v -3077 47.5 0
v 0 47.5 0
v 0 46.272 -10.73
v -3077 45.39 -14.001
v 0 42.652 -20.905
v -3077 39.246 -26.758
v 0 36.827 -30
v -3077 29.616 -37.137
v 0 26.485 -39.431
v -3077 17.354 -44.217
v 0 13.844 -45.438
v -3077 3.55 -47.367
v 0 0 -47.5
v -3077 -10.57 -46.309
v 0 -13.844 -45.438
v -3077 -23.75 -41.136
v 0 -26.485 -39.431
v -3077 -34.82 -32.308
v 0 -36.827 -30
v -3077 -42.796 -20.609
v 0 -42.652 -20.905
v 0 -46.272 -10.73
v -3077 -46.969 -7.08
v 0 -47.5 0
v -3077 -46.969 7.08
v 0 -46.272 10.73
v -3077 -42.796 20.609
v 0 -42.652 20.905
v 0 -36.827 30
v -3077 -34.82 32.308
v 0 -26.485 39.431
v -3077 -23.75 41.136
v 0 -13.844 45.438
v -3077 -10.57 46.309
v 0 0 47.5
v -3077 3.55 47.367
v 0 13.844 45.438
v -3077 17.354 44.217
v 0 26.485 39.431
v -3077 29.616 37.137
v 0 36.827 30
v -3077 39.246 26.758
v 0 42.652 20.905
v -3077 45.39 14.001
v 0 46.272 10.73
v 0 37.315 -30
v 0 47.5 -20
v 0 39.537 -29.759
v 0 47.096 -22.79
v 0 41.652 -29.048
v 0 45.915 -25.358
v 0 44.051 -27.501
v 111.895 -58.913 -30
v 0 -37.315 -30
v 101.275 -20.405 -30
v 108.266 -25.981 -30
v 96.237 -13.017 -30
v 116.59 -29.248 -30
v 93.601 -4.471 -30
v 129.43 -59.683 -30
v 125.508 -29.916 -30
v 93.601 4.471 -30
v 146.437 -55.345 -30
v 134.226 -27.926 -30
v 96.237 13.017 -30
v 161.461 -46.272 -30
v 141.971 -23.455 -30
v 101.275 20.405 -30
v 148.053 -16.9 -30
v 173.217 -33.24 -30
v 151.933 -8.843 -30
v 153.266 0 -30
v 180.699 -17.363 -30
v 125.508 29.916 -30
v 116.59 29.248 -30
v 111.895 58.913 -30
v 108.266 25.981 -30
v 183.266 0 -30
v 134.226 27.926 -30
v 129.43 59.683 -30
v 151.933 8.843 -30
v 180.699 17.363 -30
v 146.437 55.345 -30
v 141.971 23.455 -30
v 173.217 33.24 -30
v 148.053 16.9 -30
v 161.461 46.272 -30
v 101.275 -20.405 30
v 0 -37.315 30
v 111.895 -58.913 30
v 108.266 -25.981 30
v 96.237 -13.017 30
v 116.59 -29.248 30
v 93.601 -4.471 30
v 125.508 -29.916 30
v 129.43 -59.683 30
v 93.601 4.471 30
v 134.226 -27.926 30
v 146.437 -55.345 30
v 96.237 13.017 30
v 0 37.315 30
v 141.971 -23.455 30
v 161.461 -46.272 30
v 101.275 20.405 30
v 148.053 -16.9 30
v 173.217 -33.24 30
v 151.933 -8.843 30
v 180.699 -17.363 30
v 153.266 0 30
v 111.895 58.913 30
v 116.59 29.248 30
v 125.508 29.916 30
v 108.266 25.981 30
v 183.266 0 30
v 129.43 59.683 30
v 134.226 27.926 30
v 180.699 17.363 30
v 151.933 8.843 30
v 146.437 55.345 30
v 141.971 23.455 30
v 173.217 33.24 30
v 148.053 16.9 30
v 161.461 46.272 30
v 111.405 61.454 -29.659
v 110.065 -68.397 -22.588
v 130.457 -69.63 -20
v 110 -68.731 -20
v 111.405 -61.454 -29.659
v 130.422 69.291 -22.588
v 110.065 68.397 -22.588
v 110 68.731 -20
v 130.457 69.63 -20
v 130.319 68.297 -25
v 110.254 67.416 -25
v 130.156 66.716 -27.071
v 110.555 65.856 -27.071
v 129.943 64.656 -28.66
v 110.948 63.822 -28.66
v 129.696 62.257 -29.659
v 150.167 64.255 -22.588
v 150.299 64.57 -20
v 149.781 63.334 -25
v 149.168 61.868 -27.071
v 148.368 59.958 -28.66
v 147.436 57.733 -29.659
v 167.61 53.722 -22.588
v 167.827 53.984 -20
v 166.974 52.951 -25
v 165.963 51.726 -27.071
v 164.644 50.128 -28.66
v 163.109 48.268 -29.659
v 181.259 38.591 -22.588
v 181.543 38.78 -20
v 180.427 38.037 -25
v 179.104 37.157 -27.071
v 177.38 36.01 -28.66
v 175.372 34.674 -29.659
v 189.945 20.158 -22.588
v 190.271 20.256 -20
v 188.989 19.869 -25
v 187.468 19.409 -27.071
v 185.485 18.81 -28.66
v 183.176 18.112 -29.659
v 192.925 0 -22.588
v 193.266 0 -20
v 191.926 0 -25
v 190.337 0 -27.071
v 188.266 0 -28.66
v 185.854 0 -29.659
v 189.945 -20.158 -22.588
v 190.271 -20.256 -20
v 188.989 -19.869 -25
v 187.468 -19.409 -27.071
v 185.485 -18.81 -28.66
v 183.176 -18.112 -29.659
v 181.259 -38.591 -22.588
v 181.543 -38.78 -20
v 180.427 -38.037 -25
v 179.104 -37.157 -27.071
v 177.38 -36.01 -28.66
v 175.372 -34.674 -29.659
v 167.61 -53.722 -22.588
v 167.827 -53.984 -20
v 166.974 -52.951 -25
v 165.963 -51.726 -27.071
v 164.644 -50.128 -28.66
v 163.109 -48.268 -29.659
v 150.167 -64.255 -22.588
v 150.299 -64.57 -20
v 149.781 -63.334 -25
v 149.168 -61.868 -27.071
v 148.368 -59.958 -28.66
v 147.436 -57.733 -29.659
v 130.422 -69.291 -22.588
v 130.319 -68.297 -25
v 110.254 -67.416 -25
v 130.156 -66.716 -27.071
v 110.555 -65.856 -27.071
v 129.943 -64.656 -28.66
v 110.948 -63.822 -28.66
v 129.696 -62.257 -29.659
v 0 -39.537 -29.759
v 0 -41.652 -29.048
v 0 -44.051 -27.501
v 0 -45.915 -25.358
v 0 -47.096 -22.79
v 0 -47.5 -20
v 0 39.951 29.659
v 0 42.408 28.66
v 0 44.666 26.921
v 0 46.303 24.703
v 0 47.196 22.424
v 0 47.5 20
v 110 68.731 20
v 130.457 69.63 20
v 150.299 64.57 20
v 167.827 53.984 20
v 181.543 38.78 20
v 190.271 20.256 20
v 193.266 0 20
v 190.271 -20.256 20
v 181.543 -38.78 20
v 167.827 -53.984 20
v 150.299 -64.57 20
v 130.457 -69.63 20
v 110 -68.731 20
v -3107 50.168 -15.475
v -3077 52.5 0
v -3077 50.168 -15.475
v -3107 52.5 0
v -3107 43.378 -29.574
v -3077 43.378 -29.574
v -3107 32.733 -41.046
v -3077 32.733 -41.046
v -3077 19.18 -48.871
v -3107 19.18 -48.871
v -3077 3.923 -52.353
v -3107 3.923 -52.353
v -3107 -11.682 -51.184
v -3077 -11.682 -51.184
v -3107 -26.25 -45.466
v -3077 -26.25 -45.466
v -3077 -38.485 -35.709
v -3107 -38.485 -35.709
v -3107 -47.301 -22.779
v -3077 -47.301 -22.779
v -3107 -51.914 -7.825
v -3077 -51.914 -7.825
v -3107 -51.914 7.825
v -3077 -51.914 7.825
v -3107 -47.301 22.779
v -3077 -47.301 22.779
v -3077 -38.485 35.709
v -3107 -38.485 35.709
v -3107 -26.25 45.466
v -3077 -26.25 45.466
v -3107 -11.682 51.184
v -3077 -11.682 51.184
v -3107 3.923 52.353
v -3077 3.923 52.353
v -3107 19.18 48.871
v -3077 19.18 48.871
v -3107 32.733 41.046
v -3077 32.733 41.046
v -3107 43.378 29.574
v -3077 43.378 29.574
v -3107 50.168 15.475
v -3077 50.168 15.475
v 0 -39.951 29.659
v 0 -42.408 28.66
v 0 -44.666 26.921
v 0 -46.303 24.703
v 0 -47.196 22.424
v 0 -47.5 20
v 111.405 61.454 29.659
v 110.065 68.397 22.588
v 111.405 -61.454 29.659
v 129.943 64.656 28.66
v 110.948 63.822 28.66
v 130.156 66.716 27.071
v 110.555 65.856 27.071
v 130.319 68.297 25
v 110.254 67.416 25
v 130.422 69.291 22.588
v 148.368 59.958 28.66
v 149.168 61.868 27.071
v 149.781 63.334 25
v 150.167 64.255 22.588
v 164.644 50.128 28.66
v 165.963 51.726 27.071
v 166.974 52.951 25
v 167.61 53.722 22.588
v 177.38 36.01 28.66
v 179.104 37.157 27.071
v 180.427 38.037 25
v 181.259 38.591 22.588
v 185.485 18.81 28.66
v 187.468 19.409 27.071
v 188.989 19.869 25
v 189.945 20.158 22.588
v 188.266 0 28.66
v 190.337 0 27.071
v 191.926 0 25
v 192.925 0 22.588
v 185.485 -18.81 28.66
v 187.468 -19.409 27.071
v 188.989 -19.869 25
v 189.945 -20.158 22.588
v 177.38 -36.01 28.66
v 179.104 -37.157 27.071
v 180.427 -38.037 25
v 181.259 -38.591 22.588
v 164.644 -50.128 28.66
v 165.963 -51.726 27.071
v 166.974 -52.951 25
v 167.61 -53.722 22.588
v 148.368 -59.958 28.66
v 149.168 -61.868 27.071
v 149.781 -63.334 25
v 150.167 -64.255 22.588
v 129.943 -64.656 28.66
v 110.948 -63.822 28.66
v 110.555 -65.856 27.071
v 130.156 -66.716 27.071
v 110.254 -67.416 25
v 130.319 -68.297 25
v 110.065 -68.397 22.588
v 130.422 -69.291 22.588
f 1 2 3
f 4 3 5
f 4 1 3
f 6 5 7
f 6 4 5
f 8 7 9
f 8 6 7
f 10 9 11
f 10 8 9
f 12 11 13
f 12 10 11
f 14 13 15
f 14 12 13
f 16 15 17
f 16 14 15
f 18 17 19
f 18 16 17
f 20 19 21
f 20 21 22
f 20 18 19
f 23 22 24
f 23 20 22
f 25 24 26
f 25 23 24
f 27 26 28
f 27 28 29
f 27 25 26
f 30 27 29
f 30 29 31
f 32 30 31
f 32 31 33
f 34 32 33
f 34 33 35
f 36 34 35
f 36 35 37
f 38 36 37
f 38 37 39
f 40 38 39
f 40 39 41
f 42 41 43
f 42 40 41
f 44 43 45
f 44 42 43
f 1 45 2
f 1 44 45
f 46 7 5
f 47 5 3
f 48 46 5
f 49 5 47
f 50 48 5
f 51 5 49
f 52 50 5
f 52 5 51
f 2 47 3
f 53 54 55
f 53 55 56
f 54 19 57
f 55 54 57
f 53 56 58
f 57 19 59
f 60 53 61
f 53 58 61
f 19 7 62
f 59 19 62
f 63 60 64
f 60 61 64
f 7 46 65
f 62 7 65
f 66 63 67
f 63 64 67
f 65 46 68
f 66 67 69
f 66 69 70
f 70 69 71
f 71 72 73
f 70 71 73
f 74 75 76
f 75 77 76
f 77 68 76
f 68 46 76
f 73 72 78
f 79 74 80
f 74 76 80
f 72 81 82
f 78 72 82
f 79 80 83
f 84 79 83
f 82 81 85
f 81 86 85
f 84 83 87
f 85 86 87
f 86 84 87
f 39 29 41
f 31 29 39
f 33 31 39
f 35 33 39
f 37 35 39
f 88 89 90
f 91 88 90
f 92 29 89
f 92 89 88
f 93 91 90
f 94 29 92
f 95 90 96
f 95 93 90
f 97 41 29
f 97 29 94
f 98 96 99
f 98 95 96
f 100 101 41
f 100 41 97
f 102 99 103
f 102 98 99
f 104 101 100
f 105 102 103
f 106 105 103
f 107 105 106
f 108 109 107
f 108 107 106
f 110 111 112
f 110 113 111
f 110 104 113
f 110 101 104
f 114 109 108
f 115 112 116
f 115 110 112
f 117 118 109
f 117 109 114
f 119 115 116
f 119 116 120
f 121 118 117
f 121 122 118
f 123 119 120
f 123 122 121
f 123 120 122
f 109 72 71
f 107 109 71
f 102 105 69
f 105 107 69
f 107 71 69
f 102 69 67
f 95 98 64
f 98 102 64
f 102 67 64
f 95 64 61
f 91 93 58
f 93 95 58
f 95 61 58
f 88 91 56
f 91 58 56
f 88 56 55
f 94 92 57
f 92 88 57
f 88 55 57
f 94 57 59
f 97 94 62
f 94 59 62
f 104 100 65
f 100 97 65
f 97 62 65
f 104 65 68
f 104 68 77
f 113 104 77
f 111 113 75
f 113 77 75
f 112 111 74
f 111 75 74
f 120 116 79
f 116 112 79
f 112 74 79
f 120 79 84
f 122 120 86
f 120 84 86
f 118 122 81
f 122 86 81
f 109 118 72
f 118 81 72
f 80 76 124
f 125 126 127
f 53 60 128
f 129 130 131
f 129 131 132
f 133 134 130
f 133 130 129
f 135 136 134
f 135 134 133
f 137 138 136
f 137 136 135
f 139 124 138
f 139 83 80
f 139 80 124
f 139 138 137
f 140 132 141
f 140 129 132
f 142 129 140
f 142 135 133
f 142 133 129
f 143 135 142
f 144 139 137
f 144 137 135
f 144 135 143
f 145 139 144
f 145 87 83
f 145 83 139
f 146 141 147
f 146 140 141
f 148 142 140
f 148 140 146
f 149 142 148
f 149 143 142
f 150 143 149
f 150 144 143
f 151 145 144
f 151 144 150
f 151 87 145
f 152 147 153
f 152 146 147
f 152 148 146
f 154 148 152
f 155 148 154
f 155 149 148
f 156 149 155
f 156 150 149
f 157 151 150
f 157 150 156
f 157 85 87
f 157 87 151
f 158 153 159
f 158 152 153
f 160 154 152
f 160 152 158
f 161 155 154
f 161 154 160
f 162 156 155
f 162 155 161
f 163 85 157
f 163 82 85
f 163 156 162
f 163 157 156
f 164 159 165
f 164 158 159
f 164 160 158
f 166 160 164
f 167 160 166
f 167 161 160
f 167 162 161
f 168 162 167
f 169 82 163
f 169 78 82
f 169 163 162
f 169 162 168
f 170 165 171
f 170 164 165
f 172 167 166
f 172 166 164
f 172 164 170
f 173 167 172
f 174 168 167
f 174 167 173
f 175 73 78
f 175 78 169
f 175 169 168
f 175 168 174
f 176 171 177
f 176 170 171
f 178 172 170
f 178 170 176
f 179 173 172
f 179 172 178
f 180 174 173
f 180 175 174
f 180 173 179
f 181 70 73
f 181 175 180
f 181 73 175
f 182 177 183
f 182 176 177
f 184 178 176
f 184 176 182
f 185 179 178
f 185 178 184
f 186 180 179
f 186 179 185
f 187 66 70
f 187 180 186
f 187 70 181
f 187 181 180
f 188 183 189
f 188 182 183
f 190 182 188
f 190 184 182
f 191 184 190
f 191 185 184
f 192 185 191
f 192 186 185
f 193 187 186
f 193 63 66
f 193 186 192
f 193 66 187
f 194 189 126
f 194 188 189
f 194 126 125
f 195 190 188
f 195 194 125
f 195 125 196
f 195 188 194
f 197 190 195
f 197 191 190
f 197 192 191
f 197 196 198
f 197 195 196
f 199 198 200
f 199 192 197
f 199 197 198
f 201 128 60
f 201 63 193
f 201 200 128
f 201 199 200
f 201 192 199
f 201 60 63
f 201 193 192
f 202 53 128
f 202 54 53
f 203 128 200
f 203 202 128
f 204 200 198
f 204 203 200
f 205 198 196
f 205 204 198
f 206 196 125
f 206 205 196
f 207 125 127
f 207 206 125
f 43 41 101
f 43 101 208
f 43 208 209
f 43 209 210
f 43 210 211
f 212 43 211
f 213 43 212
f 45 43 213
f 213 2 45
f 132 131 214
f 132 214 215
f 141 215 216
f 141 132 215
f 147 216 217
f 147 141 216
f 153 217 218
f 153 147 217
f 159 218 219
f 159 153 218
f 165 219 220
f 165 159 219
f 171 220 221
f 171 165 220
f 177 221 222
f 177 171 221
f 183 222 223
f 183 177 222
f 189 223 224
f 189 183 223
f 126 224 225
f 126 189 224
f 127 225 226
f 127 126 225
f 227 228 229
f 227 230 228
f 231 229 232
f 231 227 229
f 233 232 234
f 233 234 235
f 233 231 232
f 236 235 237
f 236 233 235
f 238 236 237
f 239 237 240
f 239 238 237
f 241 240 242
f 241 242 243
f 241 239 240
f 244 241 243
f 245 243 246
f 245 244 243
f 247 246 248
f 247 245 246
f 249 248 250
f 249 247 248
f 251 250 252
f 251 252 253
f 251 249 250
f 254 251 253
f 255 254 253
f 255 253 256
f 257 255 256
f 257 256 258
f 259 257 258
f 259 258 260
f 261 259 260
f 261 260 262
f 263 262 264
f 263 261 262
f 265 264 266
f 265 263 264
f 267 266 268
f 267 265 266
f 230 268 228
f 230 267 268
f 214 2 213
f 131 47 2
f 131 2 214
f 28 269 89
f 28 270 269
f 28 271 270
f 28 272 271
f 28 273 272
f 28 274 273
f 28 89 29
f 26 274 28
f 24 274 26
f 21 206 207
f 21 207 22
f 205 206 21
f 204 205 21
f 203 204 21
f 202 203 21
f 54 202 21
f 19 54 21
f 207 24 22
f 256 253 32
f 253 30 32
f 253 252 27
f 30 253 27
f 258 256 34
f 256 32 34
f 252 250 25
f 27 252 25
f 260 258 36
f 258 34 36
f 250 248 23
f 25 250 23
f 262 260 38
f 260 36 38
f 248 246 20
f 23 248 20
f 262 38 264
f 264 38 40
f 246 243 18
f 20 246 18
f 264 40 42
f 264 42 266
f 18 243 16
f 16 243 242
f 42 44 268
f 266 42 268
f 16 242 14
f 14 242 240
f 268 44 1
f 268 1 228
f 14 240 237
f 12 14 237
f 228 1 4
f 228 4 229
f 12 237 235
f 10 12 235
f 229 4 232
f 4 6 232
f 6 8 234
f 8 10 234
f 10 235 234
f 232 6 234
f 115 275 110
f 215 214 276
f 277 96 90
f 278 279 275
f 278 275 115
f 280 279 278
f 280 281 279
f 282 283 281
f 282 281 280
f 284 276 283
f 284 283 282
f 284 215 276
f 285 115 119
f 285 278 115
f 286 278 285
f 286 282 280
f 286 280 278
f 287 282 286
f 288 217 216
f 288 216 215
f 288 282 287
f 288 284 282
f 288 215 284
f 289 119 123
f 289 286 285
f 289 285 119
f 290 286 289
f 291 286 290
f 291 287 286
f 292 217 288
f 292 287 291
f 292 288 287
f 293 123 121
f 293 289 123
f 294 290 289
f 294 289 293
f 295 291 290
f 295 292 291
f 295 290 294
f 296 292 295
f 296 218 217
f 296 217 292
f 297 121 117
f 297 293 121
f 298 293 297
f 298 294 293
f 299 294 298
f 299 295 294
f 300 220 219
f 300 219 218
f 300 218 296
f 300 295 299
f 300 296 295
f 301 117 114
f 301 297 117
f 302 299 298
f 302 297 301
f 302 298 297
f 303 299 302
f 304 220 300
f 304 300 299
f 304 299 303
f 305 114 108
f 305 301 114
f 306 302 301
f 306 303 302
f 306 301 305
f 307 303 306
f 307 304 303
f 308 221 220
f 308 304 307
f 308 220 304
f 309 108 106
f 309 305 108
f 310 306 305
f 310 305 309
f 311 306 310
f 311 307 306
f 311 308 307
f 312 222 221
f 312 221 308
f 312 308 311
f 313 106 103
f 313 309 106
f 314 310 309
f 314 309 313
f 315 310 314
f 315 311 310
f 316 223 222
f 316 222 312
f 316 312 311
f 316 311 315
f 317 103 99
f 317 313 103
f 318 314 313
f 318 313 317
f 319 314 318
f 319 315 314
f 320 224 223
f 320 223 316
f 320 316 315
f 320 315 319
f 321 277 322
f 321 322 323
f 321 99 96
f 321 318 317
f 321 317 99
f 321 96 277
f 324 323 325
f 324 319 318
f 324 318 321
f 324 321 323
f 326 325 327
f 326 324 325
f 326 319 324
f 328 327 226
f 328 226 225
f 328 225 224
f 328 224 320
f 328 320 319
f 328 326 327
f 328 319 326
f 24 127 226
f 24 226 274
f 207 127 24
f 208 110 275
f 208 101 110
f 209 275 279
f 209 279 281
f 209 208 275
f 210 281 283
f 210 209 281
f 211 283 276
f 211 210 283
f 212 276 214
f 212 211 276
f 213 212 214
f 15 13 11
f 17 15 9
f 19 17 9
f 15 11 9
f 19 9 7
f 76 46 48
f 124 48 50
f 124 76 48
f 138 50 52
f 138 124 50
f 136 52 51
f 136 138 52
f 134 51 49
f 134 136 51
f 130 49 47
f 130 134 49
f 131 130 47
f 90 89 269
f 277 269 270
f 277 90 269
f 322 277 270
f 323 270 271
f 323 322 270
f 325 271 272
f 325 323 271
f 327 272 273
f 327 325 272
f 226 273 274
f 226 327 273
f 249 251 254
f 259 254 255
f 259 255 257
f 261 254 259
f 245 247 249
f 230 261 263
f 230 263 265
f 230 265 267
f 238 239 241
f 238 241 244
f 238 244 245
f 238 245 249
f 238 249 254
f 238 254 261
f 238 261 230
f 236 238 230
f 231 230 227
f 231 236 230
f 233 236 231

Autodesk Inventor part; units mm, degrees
ref_plane "YZ Plane" through (0, 0, 0) normal (1, 0, 0) x (0, 1, 0)
ref_plane "XZ Plane" through (0, 0, 0) normal (0, 1, 0) x (-1, 0, 0)
ref_plane "XY Plane" through (0, 0, 0) normal (0, 0, 1) x (1, 0, 0)
sketch "Эскиз1" plane through (0, 0, 0) normal (0, 0, 1) x (1, 0, 0)
  line L0 (0, 0) -> (-3498.9825, 0)
  line L1 (0, 0) -> (0, 72.2666) construction
  line L2 (0, 47.5) -> (-3077, 47.5)
  line L3 (-3077, 47.5) -> (-3077, 52.5)
  line L4 (-3077, 52.5) -> (-3107, 52.5)
  line L5 (-3107, 52.5) -> (-3107, 0)
  line L6 (0, 0) -> (0, 47.5)
  point P0 (-3107, 0)
  dimension "d1" = 105
  dimension "d2" = 95
  dimension "d3" = 30
  dimension "d4" = 3107
revolve "Вращение1" add sketch "Эскиз1" angle 360 about axis through (0, 0, 0) along (-1, 0, 0)
sketch "Эскиз2" plane through (0, 0, 0) normal (0, 0, 1) x (1, 0, 0)
  line L0 (-3077, -47.5) -> (-3077, 47.5) projected
  line L1 (0, -47.5) -> (0, 47.5) projected
  circle A0 centre (123.2661, 0) radius 30
  circle A1 centre (123.2661, 0) radius 70
  line L2 (110, -68.7314) -> (0, -47.5)
  line L3 (0, -47.5) -> (0, 47.5) projected
  line L4 (0, 47.5) -> (110, 68.7314)
  point P0 (0, 0)
  point P1 (0, 0)
  dimension "d6" = 60
  dimension "d7" = 140
  dimension "d8" = 110
extrude "Выдавливание1" add sketch "Эскиз2" along normal mid plane 60
fillet "Сопряжение1" radius 10 6 edges at (193.2661, 0, 30) (55, -58.1157, 30) (55, 58.1157, 30) (55, -58.1157, -30) (55, 58.1157, -30) (193.2661, 0, -30)
properties part number "Lift.02.00.00.05" material "Сталь нержавеющая, 440C"
